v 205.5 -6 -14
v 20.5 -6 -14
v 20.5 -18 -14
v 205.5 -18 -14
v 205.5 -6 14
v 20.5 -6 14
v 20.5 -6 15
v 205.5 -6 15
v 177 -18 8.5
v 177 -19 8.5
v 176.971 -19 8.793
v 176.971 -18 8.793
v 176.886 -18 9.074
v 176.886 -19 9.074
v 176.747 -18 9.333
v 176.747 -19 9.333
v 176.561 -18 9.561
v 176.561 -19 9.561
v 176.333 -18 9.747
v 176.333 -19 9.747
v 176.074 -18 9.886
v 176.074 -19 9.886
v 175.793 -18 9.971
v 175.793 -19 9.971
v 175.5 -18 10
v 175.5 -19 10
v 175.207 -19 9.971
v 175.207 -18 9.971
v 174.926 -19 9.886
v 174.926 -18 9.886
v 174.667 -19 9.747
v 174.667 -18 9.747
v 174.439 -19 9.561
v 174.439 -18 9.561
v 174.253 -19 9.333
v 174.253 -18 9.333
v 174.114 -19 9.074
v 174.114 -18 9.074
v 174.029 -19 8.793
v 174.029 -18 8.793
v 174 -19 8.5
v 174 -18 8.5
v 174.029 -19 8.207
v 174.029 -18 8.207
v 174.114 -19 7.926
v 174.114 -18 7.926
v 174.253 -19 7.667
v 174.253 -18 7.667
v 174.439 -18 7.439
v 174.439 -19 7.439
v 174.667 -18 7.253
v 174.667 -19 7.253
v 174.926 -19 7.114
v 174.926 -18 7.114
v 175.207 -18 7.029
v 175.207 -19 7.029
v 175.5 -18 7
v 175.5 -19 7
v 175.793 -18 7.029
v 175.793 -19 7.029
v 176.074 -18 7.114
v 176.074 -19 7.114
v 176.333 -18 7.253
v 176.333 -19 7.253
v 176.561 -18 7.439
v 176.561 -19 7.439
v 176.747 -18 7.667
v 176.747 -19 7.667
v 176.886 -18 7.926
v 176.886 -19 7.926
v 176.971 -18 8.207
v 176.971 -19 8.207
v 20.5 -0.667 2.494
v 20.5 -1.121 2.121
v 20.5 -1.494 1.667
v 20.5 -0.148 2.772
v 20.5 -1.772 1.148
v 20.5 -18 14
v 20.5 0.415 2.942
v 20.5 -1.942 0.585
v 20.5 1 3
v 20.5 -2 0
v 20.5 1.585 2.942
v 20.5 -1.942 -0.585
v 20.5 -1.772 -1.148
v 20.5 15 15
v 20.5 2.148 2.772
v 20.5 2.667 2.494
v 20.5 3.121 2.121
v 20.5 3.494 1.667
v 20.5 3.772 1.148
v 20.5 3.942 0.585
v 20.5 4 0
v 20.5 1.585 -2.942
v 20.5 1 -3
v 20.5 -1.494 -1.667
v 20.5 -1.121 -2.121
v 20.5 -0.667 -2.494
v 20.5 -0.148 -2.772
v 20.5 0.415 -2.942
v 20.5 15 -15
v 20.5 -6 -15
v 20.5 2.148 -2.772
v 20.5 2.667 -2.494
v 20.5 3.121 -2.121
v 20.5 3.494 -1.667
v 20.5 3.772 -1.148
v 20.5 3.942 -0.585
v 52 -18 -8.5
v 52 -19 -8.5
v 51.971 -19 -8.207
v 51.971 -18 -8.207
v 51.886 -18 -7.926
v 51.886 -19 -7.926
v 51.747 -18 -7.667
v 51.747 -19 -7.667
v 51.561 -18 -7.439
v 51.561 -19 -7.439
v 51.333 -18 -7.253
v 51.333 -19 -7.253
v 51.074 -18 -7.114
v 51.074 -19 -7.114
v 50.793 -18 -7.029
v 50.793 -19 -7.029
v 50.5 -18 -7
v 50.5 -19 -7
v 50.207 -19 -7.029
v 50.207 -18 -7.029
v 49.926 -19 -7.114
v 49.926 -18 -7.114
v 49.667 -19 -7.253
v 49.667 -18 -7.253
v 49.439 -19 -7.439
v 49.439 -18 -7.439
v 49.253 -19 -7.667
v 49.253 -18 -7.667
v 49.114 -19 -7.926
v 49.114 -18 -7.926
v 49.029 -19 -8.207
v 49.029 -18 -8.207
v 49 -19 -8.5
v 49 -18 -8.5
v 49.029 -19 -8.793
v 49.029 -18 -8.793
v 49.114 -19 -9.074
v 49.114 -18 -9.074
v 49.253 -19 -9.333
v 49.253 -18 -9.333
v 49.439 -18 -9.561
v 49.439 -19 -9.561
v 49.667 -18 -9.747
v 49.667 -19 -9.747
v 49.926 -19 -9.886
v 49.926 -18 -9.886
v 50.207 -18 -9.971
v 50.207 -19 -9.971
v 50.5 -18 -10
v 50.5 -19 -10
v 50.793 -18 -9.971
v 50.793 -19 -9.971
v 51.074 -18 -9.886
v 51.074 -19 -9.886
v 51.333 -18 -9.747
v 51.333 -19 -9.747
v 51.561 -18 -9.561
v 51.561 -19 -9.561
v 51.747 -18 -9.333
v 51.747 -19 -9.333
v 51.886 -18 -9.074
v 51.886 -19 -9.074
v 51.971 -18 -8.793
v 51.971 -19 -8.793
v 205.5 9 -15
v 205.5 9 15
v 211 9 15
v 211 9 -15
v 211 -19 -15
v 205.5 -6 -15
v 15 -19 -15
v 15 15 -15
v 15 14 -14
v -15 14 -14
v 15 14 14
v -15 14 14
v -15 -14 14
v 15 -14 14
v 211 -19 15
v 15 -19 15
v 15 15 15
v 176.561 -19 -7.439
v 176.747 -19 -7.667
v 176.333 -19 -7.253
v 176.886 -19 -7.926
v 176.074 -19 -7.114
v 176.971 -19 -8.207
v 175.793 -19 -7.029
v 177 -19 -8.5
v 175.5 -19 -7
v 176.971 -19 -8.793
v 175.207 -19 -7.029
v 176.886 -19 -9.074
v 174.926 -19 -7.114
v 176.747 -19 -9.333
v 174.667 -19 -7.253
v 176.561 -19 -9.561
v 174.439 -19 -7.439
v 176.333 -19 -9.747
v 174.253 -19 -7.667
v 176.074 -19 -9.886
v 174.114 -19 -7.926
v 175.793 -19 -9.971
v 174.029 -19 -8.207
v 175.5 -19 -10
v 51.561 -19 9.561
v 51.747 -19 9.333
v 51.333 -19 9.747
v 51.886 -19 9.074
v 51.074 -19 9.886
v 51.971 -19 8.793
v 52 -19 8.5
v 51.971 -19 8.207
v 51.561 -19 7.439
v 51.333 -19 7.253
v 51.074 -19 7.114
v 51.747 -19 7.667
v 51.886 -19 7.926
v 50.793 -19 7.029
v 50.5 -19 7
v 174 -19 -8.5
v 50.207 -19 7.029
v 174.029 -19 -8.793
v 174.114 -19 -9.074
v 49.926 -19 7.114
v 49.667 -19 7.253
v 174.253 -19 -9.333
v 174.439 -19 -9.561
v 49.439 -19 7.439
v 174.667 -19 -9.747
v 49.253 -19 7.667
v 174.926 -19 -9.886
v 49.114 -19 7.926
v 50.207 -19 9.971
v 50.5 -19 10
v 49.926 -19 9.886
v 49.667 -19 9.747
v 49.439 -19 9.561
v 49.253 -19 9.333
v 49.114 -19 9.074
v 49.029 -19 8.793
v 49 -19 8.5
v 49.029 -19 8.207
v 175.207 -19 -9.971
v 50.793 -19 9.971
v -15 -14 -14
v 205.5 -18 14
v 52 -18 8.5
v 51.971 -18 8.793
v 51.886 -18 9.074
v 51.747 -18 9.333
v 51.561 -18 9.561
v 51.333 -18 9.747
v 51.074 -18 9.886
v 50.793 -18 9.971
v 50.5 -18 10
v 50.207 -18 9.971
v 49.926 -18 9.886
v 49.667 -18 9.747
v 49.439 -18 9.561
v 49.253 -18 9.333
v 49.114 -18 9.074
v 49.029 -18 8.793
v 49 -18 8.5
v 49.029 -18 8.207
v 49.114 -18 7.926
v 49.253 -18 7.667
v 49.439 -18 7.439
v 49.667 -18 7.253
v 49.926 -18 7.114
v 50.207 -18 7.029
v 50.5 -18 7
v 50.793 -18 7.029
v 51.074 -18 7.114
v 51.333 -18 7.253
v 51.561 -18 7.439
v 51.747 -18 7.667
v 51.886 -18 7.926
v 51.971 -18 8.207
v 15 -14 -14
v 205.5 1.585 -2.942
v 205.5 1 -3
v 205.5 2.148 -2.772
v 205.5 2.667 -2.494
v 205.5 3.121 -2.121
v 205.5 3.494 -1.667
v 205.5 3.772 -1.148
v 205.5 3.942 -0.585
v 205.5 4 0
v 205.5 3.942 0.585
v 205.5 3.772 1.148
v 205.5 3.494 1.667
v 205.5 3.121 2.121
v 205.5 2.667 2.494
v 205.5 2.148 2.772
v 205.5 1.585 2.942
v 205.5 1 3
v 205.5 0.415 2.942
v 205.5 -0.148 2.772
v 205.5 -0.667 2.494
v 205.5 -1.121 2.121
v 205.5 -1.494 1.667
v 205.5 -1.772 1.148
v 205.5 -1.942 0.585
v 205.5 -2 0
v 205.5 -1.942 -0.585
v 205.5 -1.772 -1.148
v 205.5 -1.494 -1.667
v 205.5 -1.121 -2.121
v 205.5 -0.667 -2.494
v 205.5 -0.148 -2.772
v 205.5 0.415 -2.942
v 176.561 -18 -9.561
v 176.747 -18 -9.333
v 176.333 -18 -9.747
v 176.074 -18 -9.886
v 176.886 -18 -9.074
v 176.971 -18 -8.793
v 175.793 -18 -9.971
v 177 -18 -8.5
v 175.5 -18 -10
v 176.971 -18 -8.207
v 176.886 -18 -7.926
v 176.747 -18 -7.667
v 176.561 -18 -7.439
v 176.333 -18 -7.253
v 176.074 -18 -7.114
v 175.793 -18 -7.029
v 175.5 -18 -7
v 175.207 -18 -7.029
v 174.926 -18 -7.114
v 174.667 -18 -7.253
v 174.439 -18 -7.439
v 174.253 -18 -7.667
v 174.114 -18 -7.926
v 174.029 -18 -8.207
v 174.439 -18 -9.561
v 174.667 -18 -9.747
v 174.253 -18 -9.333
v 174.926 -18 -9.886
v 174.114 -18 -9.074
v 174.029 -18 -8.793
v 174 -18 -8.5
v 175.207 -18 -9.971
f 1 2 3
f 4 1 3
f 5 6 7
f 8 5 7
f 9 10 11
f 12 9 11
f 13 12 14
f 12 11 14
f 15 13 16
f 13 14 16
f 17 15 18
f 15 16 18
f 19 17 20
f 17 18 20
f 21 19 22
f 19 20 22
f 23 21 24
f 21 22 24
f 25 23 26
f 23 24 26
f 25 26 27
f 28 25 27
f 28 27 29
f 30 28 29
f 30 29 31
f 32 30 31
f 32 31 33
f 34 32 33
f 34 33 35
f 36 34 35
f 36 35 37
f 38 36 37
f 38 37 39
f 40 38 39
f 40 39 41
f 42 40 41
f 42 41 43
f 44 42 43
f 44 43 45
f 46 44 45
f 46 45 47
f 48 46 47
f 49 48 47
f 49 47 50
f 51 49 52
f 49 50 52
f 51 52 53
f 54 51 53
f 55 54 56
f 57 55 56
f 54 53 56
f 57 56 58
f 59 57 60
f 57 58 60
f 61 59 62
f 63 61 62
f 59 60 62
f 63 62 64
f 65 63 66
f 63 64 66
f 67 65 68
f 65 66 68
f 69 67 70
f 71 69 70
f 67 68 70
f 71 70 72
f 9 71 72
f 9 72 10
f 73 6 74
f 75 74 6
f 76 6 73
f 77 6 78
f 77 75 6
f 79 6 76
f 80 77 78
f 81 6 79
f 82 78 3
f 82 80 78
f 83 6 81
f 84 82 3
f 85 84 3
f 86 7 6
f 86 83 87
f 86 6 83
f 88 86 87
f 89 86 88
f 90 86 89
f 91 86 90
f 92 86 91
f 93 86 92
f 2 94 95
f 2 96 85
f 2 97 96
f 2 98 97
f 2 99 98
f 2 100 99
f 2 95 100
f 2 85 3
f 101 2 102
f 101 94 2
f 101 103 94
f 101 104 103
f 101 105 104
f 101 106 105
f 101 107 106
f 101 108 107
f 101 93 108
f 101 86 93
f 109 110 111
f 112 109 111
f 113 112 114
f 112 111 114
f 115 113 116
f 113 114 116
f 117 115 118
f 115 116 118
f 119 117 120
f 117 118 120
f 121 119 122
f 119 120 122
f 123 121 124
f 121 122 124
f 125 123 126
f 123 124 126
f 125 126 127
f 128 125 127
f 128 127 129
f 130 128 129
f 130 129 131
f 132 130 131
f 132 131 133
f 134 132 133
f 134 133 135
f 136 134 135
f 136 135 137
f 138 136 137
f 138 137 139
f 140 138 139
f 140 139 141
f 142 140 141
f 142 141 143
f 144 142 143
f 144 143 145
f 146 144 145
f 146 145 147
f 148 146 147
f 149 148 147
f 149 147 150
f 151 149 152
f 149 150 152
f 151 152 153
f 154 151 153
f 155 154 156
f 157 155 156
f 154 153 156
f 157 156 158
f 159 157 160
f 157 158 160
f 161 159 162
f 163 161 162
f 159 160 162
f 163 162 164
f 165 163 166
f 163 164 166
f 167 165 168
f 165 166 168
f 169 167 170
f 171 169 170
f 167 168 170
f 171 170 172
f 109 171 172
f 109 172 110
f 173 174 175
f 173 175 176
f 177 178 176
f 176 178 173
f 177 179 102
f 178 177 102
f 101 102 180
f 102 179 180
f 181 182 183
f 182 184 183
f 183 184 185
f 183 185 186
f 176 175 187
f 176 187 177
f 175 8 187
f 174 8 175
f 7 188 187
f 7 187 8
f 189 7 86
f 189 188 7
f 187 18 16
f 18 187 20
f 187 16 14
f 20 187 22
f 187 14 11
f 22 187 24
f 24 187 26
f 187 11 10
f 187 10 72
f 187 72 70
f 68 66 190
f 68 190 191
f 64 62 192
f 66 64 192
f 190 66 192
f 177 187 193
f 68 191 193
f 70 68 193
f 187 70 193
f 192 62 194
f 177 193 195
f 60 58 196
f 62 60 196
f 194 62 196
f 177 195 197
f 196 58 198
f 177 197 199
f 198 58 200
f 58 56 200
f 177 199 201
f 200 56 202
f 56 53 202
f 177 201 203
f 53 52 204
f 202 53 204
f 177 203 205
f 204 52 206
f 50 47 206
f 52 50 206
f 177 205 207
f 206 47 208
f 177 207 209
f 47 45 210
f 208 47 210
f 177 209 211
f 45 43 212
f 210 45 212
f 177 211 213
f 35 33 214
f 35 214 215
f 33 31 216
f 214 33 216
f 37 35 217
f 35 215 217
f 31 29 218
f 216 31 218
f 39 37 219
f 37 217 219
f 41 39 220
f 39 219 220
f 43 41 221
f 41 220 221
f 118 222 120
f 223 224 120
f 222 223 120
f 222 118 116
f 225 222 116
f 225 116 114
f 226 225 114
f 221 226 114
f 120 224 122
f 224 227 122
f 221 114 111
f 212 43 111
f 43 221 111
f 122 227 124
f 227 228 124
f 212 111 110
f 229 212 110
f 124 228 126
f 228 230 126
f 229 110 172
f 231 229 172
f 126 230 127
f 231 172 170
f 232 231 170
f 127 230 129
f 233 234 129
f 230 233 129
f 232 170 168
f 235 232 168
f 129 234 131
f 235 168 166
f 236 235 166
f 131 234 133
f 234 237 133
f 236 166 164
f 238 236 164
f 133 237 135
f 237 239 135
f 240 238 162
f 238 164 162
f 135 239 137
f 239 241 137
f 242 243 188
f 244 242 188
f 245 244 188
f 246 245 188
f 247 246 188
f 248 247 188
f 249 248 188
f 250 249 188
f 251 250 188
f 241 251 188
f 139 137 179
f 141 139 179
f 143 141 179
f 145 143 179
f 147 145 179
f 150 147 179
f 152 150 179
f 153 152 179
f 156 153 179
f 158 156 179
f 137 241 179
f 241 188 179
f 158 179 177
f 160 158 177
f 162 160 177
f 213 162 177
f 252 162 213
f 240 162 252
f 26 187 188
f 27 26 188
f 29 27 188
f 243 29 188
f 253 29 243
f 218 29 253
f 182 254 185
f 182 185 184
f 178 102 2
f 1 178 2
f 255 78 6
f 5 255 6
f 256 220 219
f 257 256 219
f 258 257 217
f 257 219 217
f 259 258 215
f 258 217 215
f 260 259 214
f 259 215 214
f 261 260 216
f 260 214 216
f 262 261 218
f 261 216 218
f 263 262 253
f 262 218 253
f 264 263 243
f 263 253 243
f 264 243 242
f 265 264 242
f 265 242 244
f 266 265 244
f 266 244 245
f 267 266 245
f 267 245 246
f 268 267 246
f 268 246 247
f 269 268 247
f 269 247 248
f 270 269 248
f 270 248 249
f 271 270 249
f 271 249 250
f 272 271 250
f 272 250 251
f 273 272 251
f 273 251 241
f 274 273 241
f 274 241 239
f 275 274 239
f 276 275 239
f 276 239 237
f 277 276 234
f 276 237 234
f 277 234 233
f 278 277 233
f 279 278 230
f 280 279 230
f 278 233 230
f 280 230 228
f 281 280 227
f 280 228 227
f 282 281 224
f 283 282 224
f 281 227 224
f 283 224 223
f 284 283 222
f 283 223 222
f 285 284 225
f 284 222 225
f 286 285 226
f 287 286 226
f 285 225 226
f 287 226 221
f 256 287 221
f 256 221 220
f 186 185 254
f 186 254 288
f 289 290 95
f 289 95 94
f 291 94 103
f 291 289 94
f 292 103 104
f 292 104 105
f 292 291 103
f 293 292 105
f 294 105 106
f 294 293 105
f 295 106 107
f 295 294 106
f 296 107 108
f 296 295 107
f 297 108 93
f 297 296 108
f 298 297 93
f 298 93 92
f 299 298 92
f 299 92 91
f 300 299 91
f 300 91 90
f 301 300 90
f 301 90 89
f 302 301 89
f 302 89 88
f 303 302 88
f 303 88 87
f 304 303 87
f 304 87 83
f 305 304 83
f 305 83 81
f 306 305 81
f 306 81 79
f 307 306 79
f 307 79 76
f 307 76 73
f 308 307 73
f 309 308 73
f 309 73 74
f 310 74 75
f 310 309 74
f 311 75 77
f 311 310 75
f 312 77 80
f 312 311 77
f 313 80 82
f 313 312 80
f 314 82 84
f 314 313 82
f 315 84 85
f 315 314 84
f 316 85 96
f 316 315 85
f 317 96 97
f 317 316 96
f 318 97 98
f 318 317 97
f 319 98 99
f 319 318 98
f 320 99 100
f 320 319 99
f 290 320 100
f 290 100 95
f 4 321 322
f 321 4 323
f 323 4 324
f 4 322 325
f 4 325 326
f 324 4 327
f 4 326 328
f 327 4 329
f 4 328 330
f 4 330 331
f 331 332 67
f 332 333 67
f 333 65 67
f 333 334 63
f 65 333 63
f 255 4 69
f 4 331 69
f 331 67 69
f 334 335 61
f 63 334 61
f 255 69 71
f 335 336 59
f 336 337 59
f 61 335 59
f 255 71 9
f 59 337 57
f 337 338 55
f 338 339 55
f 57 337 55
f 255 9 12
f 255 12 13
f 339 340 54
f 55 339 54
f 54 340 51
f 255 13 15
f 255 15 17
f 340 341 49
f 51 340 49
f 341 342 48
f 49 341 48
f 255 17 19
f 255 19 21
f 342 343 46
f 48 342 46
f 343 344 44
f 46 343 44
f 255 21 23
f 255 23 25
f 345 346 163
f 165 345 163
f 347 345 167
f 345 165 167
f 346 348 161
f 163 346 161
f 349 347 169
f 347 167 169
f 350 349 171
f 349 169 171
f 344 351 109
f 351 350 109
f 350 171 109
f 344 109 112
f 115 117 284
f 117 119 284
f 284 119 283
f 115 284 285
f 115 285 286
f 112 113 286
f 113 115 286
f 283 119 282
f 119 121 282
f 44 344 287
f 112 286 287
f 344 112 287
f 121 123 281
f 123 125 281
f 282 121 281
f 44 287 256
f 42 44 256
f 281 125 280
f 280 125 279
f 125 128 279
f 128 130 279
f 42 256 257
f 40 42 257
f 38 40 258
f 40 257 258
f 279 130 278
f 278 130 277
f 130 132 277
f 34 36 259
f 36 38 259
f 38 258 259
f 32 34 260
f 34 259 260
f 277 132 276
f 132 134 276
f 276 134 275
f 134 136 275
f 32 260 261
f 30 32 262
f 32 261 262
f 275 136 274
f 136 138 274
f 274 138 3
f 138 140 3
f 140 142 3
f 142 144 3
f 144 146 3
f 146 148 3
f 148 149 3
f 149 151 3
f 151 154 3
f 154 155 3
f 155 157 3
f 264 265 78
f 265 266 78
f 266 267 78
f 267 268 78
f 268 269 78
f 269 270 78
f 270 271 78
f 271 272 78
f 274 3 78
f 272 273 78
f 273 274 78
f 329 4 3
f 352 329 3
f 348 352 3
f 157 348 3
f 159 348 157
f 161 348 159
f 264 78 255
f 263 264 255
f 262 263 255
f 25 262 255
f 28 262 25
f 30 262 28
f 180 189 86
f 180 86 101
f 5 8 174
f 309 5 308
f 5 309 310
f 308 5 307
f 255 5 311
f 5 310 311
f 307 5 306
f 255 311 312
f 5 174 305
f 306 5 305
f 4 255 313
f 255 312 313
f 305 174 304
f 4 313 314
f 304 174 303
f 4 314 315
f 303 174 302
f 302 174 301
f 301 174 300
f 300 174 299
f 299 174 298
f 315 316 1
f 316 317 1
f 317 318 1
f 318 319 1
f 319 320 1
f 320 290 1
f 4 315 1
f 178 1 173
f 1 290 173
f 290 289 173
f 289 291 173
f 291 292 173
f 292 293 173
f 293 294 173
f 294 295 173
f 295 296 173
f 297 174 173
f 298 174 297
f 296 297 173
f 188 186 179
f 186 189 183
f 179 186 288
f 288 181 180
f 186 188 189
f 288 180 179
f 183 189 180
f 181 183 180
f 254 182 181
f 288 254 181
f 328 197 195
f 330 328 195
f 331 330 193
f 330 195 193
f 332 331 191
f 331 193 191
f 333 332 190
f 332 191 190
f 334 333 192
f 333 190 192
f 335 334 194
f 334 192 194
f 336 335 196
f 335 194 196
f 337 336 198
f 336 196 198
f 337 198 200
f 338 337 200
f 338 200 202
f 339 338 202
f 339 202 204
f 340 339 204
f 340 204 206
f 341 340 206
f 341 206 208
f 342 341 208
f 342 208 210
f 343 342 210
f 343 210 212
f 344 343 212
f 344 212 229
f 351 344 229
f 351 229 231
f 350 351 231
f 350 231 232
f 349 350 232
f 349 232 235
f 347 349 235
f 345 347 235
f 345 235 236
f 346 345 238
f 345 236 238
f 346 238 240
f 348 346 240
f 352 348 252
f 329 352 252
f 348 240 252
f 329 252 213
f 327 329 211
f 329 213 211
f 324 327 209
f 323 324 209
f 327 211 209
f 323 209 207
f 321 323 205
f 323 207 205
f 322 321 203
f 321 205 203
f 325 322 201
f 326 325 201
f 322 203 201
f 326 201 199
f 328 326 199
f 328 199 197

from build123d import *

# Parameters (mm, degrees)
SKETCH_1_W         = 30
SKETCH_1_H         = 28
EXTRUDE_1_DEPTH    = 14
SKETCH_2_W         = 30
SKETCH_2_H         = 34
EXTRUDE_2_DEPTH    = 5.5
EXTRUDE_3_DEPTH    = 185
SKETCH_4_W         = 30
SKETCH_4_H         = 28
EXTRUDE_4_DEPTH    = 5.5
SKETCH_5_R         = 3
EXTRUDE_5_DEPTH    = 190.5
SKETCH1_R          = 1.5
CUT_EXTRUDE1_DEPTH = 10


with BuildPart() as part:
    # 草图1 → 凸台-拉伸1 (new body, symmetric)
    with BuildSketch(Plane.XY):
        Rectangle(SKETCH_1_W, SKETCH_1_H)
    extrude(amount=EXTRUDE_1_DEPTH, both=True)

    # 草图2 → 凸台-拉伸2 (add)
    with BuildSketch(Plane(origin=(15, 0, 0), x_dir=(0, 0, -1), z_dir=(1, 0, 0))):
        with Locations((0, -2)):
            Rectangle(SKETCH_2_W, SKETCH_2_H)
    extrude(amount=EXTRUDE_2_DEPTH)

    # 草图3 → 凸台-拉伸3 (add)
    with BuildSketch(Plane(origin=(20.5, 0, 0), x_dir=(0, 0, -1), z_dir=(1, 0, 0))):
        Polygon((-15, -19), (15, -19), (15, -6), (14, -6), (14, -18), (-14, -18), (-14, -6), (-15, -6), align=None)
    extrude(amount=EXTRUDE_3_DEPTH)

    # 草图4 → 凸台-拉伸4 (add)
    with BuildSketch(Plane(origin=(205.5, 0, 0), x_dir=(0, 0, -1), z_dir=(1, 0, 0))):
        with Locations((0, -5)):
            Rectangle(SKETCH_4_W, SKETCH_4_H)
    extrude(amount=EXTRUDE_4_DEPTH)

    # 草图5 → 凸台-拉伸5 (add)
    with BuildSketch(Plane(origin=(211, 0, 0), x_dir=(0, 0, -1), z_dir=(1, 0, 0))):
        with Locations((0, 1)):
            Circle(SKETCH_5_R)
    extrude(amount=-EXTRUDE_5_DEPTH)

    # Sketch1 → Cut-Extrude1 (cut)
    with BuildSketch(Plane.XZ.offset(19)):
        with Locations((50.5, 8.5)):
            Circle(SKETCH1_R)
        with Locations((175.5, 8.5)):
            Circle(SKETCH1_R)
        with Locations((175.5, -8.5)):
            Circle(SKETCH1_R)
        with Locations((50.5, -8.5)):
            Circle(SKETCH1_R)
    extrude(amount=-CUT_EXTRUDE1_DEPTH, mode=Mode.SUBTRACT)


solid = part.part
